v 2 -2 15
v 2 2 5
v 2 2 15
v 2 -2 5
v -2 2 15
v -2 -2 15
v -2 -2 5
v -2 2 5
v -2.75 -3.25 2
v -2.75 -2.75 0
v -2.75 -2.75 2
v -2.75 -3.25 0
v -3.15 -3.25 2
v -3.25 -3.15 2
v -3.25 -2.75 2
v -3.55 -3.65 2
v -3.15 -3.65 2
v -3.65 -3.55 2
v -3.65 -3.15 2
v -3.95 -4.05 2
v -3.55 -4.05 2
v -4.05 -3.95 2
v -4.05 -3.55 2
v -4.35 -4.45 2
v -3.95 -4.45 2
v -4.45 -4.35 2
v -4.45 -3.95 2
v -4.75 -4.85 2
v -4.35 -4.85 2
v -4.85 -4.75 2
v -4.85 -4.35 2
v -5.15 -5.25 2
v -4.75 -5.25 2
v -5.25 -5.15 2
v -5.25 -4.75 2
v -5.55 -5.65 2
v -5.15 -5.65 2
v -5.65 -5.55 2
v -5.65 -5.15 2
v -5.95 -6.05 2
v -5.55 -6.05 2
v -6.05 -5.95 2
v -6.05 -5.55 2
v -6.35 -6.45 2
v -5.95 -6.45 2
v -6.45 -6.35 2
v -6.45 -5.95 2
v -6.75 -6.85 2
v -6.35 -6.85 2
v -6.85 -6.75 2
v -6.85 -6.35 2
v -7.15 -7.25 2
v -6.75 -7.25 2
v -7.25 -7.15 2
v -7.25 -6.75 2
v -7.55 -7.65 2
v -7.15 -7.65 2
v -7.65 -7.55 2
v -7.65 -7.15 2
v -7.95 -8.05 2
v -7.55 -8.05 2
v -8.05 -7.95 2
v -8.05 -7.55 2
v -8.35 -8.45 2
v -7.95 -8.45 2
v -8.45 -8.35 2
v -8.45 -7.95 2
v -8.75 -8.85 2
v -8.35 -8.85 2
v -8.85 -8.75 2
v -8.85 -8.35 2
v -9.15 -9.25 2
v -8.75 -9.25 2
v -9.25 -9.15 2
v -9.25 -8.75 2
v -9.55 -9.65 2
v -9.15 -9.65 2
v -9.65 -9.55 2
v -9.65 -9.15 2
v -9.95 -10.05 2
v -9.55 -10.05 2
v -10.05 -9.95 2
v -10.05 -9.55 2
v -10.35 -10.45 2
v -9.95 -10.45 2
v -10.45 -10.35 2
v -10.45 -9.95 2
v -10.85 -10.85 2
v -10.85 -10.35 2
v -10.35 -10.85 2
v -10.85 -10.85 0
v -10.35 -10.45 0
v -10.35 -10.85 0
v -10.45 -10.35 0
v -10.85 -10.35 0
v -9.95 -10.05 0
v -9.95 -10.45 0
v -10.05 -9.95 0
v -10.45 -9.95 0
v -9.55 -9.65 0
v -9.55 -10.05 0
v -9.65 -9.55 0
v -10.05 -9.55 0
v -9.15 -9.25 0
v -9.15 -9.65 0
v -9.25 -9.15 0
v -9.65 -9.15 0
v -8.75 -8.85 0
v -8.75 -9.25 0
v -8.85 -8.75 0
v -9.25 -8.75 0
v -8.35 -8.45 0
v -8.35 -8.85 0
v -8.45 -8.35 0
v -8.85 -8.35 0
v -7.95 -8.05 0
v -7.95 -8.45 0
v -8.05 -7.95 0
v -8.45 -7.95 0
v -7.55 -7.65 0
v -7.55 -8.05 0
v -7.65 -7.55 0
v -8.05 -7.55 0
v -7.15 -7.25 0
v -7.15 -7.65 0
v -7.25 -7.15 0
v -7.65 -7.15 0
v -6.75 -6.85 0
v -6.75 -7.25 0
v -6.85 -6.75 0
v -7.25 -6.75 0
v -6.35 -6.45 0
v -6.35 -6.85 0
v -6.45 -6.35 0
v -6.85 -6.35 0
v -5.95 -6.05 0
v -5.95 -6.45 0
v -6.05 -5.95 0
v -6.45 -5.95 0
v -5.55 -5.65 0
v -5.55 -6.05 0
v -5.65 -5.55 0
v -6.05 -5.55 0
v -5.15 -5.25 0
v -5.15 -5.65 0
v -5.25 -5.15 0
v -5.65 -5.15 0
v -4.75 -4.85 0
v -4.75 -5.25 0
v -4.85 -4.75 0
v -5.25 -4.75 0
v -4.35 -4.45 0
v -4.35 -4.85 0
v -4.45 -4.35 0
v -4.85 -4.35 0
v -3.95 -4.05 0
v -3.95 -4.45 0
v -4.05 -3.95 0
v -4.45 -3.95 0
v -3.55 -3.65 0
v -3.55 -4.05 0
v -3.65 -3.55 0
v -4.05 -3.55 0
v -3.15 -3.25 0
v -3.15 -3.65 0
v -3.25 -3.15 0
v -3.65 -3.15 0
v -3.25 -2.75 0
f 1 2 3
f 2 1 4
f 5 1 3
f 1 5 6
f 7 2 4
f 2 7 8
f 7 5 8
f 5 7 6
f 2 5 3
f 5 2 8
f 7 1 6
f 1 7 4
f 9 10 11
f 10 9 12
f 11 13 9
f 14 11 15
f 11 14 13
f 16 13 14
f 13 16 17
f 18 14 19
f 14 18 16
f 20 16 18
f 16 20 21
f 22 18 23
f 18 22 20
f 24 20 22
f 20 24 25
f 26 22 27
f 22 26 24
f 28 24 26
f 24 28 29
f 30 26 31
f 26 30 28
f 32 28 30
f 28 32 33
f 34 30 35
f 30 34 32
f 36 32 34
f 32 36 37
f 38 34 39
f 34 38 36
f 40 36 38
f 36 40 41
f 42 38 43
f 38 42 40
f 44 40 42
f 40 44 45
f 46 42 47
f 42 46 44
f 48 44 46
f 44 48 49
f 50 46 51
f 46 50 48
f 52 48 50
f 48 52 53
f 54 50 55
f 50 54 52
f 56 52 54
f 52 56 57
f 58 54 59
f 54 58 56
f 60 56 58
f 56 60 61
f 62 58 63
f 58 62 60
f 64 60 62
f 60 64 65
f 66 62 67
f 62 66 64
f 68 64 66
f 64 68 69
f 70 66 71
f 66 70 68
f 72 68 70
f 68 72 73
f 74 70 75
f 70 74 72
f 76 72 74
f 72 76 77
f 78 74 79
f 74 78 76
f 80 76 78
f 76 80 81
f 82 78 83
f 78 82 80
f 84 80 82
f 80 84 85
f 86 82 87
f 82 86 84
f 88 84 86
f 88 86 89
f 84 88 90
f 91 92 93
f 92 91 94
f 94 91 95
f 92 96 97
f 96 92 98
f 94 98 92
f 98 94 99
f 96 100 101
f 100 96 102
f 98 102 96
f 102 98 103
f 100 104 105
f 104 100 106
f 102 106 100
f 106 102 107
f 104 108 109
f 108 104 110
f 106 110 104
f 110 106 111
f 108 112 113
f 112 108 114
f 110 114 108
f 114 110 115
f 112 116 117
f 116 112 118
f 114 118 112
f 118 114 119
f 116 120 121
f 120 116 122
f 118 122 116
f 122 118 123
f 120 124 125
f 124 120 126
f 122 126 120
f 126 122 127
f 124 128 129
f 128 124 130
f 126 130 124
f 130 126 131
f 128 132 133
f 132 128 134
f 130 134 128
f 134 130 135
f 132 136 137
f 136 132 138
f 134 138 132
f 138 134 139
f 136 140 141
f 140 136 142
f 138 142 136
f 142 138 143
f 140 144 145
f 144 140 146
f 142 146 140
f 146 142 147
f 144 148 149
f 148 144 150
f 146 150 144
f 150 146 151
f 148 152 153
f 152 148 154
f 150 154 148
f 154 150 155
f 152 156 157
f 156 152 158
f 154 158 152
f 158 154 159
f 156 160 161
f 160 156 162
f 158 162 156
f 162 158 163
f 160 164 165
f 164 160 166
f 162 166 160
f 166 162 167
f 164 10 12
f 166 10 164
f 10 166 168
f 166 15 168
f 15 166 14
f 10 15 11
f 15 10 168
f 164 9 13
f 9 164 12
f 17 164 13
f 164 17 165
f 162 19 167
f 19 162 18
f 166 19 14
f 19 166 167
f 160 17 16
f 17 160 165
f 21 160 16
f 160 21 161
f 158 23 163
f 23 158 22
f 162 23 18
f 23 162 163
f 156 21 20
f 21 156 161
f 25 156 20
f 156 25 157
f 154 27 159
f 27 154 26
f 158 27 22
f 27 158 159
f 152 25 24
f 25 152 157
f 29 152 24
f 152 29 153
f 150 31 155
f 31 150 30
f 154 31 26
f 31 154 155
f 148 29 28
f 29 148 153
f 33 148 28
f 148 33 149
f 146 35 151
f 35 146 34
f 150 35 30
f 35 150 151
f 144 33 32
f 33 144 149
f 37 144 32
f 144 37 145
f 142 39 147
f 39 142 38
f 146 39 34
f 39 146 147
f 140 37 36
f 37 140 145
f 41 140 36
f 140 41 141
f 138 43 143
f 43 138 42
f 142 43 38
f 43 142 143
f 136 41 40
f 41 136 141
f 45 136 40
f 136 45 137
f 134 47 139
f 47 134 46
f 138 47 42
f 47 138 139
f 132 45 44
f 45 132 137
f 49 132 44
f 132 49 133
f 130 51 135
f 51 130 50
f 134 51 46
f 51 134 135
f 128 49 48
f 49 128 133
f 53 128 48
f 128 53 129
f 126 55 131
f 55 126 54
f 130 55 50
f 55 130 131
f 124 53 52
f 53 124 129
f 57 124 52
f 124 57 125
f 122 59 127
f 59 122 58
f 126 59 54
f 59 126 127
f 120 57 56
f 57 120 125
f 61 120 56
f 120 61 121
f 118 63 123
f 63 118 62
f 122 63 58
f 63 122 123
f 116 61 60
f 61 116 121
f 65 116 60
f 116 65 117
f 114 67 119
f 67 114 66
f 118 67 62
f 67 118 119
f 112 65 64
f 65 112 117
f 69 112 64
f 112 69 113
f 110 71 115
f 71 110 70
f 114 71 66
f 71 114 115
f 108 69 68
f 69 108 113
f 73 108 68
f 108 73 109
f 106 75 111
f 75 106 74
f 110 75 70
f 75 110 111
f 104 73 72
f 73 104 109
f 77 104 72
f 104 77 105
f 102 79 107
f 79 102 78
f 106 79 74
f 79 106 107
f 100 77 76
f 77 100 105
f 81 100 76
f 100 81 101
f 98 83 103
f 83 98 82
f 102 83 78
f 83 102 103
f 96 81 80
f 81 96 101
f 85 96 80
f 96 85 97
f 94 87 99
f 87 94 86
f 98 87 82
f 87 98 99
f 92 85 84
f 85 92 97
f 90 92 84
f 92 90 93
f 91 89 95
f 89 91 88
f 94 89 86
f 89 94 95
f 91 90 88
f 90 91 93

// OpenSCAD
translate([0, 0, 10]) color([0,1,0,0.9]) cube([4, 4, 10], center=true);
translate([-3.0, -3.0, 1]) color([1,0,0]) cube([0.5, 0.5, 2], center=true);
translate([-3.4, -3.4, 1]) color([1,0,0]) cube([0.5, 0.5, 2], center=true);
translate([-3.8, -3.8, 1]) color([1,0,0]) cube([0.5, 0.5, 2], center=true);
translate([-4.2, -4.2, 1]) color([1,0,0]) cube([0.5, 0.5, 2], center=true);
translate([-4.6, -4.6, 1]) color([1,0,0]) cube([0.5, 0.5, 2], center=true);
translate([-5.0, -5.0, 1]) color([1,0,0]) cube([0.5, 0.5, 2], center=true);
translate([-5.4, -5.4, 1]) color([1,0,0]) cube([0.5, 0.5, 2], center=true);
translate([-5.8, -5.8, 1]) color([1,0,0]) cube([0.5, 0.5, 2], center=true);
translate([-6.2, -6.2, 1]) color([1,0,0]) cube([0.5, 0.5, 2], center=true);
translate([-6.6, -6.6, 1]) color([1,0,0]) cube([0.5, 0.5, 2], center=true);
translate([-7.0, -7.0, 1]) color([1,0,0]) cube([0.5, 0.5, 2], center=true);
translate([-7.4, -7.4, 1]) color([1,0,0]) cube([0.5, 0.5, 2], center=true);
translate([-7.8, -7.8, 1]) color([1,0,0]) cube([0.5, 0.5, 2], center=true);
translate([-8.2, -8.2, 1]) color([1,0,0]) cube([0.5, 0.5, 2], center=true);
translate([-8.6, -8.6, 1]) color([1,0,0]) cube([0.5, 0.5, 2], center=true);
translate([-9.0, -9.0, 1]) color([1,0,0]) cube([0.5, 0.5, 2], center=true);
translate([-9.4, -9.4, 1]) color([1,0,0]) cube([0.5, 0.5, 2], center=true);
translate([-9.8, -9.8, 1]) color([1,0,0]) cube([0.5, 0.5, 2], center=true);
translate([-10.2, -10.2, 1]) color([1,0,0]) cube([0.5, 0.5, 2], center=true);
translate([-10.6, -10.6, 1]) color([1,0,0]) cube([0.5, 0.5, 2], center=true);
